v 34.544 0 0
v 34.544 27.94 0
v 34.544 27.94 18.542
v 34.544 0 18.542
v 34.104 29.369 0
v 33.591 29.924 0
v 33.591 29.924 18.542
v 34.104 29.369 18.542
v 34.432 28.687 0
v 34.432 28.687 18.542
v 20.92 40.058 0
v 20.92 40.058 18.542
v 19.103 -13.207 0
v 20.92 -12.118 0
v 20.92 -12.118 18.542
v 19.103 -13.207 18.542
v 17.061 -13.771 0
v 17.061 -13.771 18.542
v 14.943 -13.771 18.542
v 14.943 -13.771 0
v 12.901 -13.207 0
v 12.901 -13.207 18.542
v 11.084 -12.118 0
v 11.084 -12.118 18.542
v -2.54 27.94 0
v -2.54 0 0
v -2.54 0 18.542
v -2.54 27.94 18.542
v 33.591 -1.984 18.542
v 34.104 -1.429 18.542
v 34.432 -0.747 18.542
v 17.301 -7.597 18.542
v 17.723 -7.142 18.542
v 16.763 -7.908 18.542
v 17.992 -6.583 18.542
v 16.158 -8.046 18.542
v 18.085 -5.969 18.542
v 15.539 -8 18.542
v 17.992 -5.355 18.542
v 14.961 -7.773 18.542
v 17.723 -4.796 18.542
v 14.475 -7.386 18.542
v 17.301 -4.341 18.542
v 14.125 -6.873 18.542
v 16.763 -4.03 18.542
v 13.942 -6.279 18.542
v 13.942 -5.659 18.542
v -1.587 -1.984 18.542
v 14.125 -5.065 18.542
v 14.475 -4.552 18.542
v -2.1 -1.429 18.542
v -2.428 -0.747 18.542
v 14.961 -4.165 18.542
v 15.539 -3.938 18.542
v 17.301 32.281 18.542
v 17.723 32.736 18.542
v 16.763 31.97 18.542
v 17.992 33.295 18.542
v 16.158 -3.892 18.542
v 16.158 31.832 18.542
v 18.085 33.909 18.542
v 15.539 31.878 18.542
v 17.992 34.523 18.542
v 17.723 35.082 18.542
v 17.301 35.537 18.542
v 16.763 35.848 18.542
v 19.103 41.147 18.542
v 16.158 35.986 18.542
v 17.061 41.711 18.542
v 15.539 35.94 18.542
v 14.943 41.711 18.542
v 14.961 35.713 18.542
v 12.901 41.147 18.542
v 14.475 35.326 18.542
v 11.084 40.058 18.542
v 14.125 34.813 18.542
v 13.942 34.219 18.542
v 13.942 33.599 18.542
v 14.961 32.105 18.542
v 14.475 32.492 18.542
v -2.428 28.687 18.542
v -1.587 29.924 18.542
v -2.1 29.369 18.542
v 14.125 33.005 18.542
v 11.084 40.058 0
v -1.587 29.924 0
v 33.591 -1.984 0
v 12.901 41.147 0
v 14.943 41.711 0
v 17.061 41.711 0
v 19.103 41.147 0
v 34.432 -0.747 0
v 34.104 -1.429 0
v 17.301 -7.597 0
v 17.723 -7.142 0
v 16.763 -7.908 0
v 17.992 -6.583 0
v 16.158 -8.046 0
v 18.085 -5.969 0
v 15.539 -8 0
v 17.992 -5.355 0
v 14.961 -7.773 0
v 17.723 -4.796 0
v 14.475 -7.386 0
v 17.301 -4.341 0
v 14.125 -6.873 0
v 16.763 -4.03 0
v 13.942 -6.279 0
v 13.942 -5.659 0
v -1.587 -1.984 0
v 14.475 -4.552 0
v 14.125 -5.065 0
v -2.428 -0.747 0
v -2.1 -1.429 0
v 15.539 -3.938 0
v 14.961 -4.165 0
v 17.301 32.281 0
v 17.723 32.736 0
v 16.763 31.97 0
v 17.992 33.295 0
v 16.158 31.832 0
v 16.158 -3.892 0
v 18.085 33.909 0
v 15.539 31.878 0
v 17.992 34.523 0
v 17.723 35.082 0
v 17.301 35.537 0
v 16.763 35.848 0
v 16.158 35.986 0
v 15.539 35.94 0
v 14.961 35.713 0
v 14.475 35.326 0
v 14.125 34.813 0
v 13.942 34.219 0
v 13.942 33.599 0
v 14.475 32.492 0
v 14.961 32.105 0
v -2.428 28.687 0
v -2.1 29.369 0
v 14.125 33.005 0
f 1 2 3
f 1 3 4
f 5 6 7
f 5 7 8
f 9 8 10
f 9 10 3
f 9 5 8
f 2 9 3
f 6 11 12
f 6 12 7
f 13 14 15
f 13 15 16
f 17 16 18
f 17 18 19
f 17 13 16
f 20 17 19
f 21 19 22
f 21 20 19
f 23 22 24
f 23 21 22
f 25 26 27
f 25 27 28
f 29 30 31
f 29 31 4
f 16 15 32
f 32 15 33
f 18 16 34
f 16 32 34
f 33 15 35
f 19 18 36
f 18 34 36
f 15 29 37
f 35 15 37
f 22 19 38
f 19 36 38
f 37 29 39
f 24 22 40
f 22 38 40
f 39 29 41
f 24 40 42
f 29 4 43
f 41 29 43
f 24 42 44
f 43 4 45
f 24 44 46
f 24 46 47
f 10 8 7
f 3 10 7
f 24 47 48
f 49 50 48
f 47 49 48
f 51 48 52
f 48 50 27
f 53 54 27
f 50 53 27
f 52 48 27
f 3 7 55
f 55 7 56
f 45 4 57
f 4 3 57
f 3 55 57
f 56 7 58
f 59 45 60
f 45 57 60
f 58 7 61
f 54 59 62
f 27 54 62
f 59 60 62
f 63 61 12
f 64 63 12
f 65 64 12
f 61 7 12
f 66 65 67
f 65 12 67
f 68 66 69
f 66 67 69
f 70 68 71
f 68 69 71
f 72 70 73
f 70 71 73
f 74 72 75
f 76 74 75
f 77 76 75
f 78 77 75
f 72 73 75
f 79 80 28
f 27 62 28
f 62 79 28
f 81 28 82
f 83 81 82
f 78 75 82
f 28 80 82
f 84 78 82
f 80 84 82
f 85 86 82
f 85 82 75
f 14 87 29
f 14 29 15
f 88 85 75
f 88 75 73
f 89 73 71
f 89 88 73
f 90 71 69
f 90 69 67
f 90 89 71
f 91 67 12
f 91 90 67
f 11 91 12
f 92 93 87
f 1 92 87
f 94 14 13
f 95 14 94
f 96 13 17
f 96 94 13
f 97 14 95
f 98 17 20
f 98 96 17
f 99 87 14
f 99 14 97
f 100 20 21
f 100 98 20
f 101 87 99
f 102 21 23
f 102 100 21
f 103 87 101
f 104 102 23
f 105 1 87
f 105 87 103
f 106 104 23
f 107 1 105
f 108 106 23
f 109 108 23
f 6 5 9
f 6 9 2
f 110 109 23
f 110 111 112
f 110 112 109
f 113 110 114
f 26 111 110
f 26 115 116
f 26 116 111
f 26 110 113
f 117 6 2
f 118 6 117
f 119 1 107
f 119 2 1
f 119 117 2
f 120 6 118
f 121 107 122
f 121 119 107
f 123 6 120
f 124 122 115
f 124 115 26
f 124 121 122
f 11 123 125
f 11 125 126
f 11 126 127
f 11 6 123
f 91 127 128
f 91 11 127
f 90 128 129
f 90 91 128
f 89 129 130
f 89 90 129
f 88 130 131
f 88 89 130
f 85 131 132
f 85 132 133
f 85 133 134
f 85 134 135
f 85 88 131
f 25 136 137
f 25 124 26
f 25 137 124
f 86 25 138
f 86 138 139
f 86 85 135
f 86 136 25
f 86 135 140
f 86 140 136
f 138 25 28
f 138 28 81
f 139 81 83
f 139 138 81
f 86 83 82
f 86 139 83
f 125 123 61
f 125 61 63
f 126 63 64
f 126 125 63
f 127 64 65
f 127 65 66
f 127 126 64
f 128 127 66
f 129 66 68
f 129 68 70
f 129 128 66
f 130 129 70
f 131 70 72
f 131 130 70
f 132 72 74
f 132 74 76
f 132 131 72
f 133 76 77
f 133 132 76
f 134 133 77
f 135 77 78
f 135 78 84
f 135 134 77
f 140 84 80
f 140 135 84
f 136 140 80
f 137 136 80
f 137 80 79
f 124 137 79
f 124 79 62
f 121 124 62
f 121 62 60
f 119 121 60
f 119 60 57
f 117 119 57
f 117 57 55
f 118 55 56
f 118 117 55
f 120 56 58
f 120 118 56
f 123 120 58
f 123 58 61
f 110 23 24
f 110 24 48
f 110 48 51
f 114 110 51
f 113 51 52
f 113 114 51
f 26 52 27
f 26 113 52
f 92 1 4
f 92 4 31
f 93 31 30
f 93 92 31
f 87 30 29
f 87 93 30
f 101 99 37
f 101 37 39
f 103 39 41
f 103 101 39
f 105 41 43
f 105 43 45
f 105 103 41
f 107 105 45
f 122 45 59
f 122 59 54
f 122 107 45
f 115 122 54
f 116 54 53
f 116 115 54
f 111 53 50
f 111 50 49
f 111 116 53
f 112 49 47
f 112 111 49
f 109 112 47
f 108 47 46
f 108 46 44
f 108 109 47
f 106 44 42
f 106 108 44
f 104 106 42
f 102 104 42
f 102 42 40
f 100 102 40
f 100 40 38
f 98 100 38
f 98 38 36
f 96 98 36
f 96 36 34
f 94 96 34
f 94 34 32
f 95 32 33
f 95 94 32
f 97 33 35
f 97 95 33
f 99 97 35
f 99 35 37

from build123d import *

# Parameters (mm, degrees)
SKETCH1_R           = 2.0828
BOSS_EXTRUDE1_DEPTH = 18.542


with BuildPart() as part:
    # Sketch1 → Boss-Extrude1 (new body)
    with BuildSketch(Plane.XY):
        with BuildLine():
            Line((-2.54, 0), (-2.54, 27.94))
            ThreePointArc((-2.54, 27.94), (-2.289263959, 29.040395622), (-1.586558642, 29.923540188))
            Line((-1.586558642, 29.923540188), (11.083668211, 40.057974582))
            ThreePointArc((11.083668211, 40.057974582), (16.002, 41.783), (20.920331789, 40.057974582))
            Line((20.920331789, 40.057974582), (33.590558642, 29.923540188))
            ThreePointArc((33.590558642, 29.923540188), (34.293263959, 29.040395622), (34.544, 27.94))
            Line((34.544, 27.94), (34.544, 0))
            ThreePointArc((34.544, 0), (34.293263959, -1.100395622), (33.590558642, -1.983540188))
            Line((33.590558642, -1.983540188), (20.920331789, -12.117974582))
            ThreePointArc((20.920331789, -12.117974582), (16.002, -13.843), (11.083668211, -12.117974582))
            Line((11.083668211, -12.117974582), (-1.586558642, -1.983540188))
            ThreePointArc((-1.586558642, -1.983540188), (-2.289263959, -1.100395622), (-2.54, 0))
        make_face()
        with Locations((16.002, 33.909)):
            Circle(SKETCH1_R, mode=Mode.SUBTRACT)
        with Locations((16.002, -5.969)):
            Circle(SKETCH1_R, mode=Mode.SUBTRACT)
    extrude(amount=BOSS_EXTRUDE1_DEPTH)


solid = part.part
